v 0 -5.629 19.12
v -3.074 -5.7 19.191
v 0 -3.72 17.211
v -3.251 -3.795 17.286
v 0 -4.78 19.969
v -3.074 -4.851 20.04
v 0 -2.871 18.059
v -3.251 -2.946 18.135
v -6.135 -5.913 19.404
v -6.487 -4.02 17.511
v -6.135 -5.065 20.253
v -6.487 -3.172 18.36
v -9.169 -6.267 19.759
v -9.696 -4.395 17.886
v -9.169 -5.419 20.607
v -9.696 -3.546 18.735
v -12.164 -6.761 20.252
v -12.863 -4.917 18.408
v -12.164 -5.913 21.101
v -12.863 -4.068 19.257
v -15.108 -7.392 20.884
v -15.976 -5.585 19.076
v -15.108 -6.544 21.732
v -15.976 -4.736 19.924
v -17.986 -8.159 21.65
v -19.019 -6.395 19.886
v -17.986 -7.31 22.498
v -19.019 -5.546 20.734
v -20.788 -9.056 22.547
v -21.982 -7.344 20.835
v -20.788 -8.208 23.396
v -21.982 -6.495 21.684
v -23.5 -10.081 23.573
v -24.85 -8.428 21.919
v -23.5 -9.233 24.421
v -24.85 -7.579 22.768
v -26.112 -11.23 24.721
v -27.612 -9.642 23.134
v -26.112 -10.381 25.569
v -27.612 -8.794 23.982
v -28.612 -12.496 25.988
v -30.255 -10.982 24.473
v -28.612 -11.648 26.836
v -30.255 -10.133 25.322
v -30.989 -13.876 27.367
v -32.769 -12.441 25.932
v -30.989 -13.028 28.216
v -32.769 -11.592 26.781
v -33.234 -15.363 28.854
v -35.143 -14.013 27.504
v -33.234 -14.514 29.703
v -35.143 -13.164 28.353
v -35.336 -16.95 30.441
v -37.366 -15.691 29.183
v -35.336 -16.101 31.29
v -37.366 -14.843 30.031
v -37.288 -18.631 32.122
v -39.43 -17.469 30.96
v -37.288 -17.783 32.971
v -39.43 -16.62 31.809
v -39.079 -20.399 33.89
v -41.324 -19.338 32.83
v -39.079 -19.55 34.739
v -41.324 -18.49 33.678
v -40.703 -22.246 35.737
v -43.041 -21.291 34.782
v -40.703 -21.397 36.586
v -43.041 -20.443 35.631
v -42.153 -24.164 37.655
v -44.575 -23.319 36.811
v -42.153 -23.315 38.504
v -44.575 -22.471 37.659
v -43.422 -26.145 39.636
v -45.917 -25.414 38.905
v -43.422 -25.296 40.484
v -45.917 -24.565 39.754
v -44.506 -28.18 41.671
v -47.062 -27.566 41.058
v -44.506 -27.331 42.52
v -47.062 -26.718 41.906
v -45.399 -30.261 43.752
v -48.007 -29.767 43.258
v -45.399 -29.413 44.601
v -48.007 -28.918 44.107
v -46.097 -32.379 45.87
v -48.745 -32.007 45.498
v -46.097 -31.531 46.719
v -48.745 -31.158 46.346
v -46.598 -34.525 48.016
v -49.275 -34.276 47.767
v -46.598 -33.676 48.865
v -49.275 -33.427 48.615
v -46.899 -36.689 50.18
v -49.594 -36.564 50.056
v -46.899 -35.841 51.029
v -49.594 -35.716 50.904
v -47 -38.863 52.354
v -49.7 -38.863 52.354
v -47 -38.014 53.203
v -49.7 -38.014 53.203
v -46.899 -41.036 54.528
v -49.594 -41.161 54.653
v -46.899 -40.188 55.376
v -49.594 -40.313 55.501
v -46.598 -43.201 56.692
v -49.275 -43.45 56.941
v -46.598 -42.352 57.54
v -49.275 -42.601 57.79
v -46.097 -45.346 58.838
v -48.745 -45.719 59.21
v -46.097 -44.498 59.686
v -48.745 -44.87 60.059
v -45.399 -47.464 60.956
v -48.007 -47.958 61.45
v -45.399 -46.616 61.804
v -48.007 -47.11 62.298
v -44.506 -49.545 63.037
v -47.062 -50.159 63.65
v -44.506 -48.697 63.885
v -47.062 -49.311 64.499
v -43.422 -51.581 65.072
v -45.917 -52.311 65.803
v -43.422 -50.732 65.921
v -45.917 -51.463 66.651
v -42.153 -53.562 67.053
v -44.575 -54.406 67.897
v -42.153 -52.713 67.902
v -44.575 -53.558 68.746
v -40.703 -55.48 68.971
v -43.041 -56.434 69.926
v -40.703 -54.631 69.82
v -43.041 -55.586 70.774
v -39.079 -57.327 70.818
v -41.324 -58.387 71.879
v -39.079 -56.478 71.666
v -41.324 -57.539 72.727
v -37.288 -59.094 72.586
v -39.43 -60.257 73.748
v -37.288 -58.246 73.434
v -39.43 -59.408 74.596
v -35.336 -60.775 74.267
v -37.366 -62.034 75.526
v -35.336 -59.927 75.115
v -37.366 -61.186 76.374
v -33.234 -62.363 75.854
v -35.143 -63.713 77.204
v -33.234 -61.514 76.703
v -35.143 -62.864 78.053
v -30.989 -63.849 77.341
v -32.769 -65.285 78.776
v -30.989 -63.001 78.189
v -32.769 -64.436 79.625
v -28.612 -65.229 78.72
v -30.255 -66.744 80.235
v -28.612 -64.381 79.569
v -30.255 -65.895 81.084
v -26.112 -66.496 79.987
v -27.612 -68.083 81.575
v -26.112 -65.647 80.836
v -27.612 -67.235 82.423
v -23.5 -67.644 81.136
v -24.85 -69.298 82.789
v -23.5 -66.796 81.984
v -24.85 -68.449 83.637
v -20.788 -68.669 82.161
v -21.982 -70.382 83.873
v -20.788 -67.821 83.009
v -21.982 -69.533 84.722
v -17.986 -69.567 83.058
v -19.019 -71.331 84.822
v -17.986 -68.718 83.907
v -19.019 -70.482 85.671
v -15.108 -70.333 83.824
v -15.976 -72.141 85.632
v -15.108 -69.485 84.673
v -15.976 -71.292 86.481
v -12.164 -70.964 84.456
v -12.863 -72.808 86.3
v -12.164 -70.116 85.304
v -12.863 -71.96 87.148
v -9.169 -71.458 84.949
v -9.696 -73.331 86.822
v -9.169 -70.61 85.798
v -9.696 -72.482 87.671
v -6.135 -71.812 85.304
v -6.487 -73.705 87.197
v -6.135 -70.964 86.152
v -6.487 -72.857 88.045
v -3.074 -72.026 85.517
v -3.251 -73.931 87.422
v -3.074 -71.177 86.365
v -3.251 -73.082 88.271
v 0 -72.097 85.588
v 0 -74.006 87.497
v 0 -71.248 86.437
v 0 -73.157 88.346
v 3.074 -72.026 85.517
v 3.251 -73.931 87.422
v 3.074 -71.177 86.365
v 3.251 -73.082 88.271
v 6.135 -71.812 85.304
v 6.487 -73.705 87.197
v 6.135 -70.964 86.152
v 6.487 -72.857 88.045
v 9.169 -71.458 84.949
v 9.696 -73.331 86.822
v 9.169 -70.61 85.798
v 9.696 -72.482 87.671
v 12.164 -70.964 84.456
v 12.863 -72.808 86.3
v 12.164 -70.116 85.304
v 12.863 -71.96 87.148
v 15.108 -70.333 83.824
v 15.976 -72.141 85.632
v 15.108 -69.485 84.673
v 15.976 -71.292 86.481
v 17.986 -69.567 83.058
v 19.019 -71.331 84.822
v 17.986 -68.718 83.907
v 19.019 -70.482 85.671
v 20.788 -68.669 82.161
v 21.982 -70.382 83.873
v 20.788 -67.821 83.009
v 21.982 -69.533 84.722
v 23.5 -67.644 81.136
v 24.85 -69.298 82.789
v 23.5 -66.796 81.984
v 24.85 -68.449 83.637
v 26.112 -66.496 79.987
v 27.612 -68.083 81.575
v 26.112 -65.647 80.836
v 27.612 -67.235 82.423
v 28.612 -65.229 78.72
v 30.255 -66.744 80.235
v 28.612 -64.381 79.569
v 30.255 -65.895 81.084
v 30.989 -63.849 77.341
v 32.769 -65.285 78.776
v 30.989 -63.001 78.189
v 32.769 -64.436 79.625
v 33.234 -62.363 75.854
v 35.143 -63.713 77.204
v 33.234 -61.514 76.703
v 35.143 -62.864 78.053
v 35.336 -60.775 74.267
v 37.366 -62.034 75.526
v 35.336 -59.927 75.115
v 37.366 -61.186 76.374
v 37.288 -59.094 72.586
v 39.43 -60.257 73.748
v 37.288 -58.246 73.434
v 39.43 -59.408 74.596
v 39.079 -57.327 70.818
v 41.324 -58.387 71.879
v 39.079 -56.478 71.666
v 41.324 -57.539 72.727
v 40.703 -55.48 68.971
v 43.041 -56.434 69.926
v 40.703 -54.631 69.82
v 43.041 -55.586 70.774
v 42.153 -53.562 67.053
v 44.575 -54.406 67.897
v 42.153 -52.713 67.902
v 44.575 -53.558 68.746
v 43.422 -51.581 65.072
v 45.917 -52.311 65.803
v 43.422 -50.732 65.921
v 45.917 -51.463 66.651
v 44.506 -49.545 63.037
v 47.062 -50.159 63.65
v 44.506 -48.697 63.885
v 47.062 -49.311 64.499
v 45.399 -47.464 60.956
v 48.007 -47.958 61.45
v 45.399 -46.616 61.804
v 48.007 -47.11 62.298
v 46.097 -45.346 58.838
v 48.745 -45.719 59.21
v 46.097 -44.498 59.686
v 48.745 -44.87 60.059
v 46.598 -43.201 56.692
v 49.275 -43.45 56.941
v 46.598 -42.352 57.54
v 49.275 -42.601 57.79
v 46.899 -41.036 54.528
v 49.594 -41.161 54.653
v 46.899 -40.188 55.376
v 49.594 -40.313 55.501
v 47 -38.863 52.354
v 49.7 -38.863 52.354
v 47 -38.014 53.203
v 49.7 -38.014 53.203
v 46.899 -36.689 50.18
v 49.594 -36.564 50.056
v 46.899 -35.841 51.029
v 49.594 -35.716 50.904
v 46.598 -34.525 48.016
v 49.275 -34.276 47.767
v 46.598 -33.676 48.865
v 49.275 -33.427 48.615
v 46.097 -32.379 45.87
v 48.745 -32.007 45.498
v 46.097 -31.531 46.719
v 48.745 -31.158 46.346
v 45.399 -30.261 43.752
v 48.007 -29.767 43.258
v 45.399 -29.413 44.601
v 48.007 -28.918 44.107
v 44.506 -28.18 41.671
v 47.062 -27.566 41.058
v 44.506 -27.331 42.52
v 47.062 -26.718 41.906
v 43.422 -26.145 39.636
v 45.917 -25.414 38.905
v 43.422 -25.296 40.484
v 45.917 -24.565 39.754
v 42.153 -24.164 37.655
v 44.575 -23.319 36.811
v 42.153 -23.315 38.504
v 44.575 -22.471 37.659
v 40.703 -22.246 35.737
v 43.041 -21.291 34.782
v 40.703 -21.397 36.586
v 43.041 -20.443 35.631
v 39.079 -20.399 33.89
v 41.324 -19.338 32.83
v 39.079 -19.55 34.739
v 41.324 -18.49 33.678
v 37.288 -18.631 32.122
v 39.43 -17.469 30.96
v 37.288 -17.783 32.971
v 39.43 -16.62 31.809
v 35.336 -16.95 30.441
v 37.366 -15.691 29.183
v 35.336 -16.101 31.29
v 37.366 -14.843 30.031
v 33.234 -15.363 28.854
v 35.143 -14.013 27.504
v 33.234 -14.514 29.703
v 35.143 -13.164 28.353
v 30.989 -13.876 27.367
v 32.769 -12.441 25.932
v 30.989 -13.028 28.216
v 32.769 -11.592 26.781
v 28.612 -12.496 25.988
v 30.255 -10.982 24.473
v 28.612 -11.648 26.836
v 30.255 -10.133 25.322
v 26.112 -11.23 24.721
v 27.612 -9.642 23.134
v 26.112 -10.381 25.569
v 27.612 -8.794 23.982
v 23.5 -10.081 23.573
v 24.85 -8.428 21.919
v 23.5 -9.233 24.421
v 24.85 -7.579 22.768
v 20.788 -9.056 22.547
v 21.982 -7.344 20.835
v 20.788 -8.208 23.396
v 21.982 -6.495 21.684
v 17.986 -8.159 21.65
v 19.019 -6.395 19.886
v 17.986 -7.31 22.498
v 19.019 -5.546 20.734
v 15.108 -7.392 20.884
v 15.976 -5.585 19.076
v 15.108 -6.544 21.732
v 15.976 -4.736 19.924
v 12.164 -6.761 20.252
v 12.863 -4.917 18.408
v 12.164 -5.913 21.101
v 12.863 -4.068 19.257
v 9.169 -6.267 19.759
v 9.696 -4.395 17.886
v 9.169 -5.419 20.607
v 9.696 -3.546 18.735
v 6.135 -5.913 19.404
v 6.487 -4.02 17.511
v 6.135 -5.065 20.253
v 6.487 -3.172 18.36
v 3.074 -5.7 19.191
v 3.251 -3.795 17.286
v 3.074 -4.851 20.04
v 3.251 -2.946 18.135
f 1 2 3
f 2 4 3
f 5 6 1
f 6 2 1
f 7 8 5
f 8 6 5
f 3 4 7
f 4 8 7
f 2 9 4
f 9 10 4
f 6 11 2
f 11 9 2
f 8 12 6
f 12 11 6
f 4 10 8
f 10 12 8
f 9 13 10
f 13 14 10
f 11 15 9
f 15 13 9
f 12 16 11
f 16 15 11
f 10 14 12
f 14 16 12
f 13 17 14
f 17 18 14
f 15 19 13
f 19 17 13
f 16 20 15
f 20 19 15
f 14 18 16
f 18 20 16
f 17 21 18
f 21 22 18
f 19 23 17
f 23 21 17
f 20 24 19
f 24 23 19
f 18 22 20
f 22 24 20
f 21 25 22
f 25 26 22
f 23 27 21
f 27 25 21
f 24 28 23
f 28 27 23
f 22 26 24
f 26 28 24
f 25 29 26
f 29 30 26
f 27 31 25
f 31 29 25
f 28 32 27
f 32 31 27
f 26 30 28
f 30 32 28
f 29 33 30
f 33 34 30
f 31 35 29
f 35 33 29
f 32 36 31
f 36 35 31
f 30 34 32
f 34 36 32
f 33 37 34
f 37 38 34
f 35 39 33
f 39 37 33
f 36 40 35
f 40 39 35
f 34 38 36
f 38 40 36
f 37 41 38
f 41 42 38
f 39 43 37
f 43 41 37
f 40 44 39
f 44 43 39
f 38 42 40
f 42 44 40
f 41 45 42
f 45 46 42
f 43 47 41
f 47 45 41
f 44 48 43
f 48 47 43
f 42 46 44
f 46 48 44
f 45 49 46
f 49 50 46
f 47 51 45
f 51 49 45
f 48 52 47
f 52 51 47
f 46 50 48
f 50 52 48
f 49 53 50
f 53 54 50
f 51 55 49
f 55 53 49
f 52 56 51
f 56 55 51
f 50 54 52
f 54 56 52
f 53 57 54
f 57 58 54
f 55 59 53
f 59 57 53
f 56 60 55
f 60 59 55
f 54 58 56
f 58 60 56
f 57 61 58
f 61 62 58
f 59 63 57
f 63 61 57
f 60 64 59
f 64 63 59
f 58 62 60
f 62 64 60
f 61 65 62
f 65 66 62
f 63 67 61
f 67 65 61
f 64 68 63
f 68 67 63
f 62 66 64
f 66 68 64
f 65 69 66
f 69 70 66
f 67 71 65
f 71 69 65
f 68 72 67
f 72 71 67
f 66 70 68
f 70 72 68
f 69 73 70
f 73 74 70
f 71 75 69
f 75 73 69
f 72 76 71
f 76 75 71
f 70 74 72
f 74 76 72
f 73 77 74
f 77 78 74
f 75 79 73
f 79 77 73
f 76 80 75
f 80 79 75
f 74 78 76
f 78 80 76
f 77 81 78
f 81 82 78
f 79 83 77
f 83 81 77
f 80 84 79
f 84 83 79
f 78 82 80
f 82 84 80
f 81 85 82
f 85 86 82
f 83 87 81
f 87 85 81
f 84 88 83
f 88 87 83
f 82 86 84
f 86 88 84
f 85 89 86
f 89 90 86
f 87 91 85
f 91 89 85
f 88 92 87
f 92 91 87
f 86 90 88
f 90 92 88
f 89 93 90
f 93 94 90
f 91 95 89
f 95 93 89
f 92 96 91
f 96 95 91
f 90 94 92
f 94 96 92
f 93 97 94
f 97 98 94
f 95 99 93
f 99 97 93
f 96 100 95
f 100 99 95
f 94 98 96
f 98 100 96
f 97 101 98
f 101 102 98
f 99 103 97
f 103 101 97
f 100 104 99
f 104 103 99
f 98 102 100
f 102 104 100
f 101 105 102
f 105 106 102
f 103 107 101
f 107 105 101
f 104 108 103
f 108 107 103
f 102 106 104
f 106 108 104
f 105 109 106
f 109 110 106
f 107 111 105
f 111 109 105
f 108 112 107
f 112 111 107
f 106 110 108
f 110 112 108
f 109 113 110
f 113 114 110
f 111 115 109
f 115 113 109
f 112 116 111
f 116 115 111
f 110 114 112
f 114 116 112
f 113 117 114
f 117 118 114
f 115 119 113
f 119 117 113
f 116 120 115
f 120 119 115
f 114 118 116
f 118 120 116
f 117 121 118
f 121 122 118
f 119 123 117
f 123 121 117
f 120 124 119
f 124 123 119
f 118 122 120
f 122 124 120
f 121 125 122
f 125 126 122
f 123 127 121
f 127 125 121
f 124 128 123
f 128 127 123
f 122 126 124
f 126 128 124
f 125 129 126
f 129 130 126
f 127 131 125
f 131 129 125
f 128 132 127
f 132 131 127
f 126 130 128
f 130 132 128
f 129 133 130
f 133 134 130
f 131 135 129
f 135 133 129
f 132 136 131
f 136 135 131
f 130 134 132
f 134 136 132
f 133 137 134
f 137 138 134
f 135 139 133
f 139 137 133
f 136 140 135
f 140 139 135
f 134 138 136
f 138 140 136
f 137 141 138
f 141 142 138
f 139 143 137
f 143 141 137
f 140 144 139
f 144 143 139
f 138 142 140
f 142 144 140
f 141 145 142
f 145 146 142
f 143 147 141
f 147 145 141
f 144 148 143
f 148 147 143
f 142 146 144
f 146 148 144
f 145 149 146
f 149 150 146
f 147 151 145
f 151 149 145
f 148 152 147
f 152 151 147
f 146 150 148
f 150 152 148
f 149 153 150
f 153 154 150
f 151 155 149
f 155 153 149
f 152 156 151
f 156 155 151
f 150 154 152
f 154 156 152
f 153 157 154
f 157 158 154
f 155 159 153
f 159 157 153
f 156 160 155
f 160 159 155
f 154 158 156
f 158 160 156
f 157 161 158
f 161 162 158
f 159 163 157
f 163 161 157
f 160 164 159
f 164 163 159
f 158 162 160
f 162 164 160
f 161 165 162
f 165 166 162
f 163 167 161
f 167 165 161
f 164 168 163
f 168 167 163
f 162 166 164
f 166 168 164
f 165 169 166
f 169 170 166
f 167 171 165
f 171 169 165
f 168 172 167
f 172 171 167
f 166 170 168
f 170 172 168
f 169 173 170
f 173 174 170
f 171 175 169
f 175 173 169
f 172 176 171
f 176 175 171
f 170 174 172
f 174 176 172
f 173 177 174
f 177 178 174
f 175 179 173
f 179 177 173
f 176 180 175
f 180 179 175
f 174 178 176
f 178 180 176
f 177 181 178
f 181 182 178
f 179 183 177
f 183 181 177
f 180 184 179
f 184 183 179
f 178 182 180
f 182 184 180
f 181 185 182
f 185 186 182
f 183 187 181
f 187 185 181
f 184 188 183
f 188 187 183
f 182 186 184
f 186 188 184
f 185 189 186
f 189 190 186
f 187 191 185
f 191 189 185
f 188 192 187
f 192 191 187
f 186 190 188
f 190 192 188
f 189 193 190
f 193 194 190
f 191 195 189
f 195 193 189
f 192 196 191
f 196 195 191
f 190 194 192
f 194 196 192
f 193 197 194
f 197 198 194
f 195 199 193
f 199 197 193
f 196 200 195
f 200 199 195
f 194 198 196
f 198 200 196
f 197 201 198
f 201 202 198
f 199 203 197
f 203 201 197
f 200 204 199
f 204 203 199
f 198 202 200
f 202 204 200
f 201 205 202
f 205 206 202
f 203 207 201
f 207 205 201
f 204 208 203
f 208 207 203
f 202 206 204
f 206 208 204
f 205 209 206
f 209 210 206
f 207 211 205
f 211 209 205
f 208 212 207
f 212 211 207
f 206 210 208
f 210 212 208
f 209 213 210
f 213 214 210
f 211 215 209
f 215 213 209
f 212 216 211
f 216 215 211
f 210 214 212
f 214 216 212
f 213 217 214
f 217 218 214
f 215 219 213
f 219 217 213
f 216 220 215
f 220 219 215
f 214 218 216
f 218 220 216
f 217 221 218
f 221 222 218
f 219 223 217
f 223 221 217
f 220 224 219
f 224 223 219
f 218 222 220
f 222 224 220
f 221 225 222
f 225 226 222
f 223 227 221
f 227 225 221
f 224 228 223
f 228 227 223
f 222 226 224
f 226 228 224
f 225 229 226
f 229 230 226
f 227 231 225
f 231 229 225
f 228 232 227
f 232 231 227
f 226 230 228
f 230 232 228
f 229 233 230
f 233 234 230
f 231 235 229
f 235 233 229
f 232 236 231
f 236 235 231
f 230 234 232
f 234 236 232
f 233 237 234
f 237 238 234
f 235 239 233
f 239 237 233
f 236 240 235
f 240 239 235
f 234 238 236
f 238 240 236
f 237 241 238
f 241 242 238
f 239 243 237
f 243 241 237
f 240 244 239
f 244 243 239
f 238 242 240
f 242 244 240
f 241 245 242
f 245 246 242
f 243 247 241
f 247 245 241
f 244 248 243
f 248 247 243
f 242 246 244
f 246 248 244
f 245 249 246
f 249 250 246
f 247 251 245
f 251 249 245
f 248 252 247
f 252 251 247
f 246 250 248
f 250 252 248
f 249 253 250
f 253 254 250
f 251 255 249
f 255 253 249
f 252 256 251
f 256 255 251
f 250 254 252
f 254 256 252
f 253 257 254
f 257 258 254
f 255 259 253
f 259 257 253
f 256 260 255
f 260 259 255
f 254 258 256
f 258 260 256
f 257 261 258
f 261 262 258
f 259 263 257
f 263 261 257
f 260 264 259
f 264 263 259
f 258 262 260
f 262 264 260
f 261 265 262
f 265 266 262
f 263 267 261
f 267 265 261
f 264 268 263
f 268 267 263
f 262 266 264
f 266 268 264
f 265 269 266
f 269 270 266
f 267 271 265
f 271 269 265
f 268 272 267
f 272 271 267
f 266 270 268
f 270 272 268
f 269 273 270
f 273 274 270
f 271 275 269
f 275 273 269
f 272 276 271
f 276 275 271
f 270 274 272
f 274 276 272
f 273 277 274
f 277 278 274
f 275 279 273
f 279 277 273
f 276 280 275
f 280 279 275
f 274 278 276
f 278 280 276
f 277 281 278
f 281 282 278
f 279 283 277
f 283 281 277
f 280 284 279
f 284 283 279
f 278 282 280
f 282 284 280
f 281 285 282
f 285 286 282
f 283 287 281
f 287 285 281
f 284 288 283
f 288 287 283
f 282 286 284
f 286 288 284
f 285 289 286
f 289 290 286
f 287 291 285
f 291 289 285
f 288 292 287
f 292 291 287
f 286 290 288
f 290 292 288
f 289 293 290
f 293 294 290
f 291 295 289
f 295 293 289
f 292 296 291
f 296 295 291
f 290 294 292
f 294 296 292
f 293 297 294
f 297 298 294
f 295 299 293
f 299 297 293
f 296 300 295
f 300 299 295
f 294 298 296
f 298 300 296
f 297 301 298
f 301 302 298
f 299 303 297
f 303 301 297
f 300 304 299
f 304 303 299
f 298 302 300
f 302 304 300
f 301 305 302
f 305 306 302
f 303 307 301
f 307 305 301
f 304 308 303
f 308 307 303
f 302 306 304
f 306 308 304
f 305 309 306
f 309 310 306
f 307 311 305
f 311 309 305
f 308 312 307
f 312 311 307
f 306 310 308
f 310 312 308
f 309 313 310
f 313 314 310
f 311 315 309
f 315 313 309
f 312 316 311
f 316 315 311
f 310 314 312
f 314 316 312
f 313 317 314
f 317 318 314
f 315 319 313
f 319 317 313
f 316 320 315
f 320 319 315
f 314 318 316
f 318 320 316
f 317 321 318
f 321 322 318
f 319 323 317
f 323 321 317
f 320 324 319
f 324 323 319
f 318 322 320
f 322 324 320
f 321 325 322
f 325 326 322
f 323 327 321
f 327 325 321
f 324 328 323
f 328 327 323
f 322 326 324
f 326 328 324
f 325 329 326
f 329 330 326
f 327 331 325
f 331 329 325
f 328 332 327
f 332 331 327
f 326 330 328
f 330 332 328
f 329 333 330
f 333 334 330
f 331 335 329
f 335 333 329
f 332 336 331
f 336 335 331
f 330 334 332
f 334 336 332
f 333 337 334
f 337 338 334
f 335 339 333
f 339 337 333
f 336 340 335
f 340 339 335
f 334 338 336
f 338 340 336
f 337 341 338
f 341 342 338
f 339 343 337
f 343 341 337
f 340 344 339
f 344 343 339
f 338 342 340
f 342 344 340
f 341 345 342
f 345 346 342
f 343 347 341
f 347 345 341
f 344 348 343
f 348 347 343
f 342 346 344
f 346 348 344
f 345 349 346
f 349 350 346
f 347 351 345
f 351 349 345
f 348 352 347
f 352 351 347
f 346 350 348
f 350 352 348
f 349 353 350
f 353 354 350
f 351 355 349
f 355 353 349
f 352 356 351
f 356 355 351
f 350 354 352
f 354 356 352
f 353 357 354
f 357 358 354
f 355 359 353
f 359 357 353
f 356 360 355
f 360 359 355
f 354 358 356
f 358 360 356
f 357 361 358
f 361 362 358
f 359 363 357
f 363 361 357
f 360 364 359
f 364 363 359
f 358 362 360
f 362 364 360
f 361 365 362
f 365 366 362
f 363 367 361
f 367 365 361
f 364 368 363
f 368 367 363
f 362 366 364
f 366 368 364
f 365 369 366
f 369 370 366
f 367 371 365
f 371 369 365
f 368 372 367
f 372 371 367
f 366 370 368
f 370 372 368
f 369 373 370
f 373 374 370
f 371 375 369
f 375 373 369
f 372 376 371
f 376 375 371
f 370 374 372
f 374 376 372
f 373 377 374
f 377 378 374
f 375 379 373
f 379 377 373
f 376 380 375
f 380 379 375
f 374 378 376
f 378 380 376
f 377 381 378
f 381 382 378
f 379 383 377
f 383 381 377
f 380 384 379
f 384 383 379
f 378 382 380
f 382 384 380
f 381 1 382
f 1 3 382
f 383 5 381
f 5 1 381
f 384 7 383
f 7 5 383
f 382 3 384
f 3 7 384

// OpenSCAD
include <../lib/servo-duct-manifold-lib.scad>;
$fn = 96;
cubic_cell_1_gasket();
